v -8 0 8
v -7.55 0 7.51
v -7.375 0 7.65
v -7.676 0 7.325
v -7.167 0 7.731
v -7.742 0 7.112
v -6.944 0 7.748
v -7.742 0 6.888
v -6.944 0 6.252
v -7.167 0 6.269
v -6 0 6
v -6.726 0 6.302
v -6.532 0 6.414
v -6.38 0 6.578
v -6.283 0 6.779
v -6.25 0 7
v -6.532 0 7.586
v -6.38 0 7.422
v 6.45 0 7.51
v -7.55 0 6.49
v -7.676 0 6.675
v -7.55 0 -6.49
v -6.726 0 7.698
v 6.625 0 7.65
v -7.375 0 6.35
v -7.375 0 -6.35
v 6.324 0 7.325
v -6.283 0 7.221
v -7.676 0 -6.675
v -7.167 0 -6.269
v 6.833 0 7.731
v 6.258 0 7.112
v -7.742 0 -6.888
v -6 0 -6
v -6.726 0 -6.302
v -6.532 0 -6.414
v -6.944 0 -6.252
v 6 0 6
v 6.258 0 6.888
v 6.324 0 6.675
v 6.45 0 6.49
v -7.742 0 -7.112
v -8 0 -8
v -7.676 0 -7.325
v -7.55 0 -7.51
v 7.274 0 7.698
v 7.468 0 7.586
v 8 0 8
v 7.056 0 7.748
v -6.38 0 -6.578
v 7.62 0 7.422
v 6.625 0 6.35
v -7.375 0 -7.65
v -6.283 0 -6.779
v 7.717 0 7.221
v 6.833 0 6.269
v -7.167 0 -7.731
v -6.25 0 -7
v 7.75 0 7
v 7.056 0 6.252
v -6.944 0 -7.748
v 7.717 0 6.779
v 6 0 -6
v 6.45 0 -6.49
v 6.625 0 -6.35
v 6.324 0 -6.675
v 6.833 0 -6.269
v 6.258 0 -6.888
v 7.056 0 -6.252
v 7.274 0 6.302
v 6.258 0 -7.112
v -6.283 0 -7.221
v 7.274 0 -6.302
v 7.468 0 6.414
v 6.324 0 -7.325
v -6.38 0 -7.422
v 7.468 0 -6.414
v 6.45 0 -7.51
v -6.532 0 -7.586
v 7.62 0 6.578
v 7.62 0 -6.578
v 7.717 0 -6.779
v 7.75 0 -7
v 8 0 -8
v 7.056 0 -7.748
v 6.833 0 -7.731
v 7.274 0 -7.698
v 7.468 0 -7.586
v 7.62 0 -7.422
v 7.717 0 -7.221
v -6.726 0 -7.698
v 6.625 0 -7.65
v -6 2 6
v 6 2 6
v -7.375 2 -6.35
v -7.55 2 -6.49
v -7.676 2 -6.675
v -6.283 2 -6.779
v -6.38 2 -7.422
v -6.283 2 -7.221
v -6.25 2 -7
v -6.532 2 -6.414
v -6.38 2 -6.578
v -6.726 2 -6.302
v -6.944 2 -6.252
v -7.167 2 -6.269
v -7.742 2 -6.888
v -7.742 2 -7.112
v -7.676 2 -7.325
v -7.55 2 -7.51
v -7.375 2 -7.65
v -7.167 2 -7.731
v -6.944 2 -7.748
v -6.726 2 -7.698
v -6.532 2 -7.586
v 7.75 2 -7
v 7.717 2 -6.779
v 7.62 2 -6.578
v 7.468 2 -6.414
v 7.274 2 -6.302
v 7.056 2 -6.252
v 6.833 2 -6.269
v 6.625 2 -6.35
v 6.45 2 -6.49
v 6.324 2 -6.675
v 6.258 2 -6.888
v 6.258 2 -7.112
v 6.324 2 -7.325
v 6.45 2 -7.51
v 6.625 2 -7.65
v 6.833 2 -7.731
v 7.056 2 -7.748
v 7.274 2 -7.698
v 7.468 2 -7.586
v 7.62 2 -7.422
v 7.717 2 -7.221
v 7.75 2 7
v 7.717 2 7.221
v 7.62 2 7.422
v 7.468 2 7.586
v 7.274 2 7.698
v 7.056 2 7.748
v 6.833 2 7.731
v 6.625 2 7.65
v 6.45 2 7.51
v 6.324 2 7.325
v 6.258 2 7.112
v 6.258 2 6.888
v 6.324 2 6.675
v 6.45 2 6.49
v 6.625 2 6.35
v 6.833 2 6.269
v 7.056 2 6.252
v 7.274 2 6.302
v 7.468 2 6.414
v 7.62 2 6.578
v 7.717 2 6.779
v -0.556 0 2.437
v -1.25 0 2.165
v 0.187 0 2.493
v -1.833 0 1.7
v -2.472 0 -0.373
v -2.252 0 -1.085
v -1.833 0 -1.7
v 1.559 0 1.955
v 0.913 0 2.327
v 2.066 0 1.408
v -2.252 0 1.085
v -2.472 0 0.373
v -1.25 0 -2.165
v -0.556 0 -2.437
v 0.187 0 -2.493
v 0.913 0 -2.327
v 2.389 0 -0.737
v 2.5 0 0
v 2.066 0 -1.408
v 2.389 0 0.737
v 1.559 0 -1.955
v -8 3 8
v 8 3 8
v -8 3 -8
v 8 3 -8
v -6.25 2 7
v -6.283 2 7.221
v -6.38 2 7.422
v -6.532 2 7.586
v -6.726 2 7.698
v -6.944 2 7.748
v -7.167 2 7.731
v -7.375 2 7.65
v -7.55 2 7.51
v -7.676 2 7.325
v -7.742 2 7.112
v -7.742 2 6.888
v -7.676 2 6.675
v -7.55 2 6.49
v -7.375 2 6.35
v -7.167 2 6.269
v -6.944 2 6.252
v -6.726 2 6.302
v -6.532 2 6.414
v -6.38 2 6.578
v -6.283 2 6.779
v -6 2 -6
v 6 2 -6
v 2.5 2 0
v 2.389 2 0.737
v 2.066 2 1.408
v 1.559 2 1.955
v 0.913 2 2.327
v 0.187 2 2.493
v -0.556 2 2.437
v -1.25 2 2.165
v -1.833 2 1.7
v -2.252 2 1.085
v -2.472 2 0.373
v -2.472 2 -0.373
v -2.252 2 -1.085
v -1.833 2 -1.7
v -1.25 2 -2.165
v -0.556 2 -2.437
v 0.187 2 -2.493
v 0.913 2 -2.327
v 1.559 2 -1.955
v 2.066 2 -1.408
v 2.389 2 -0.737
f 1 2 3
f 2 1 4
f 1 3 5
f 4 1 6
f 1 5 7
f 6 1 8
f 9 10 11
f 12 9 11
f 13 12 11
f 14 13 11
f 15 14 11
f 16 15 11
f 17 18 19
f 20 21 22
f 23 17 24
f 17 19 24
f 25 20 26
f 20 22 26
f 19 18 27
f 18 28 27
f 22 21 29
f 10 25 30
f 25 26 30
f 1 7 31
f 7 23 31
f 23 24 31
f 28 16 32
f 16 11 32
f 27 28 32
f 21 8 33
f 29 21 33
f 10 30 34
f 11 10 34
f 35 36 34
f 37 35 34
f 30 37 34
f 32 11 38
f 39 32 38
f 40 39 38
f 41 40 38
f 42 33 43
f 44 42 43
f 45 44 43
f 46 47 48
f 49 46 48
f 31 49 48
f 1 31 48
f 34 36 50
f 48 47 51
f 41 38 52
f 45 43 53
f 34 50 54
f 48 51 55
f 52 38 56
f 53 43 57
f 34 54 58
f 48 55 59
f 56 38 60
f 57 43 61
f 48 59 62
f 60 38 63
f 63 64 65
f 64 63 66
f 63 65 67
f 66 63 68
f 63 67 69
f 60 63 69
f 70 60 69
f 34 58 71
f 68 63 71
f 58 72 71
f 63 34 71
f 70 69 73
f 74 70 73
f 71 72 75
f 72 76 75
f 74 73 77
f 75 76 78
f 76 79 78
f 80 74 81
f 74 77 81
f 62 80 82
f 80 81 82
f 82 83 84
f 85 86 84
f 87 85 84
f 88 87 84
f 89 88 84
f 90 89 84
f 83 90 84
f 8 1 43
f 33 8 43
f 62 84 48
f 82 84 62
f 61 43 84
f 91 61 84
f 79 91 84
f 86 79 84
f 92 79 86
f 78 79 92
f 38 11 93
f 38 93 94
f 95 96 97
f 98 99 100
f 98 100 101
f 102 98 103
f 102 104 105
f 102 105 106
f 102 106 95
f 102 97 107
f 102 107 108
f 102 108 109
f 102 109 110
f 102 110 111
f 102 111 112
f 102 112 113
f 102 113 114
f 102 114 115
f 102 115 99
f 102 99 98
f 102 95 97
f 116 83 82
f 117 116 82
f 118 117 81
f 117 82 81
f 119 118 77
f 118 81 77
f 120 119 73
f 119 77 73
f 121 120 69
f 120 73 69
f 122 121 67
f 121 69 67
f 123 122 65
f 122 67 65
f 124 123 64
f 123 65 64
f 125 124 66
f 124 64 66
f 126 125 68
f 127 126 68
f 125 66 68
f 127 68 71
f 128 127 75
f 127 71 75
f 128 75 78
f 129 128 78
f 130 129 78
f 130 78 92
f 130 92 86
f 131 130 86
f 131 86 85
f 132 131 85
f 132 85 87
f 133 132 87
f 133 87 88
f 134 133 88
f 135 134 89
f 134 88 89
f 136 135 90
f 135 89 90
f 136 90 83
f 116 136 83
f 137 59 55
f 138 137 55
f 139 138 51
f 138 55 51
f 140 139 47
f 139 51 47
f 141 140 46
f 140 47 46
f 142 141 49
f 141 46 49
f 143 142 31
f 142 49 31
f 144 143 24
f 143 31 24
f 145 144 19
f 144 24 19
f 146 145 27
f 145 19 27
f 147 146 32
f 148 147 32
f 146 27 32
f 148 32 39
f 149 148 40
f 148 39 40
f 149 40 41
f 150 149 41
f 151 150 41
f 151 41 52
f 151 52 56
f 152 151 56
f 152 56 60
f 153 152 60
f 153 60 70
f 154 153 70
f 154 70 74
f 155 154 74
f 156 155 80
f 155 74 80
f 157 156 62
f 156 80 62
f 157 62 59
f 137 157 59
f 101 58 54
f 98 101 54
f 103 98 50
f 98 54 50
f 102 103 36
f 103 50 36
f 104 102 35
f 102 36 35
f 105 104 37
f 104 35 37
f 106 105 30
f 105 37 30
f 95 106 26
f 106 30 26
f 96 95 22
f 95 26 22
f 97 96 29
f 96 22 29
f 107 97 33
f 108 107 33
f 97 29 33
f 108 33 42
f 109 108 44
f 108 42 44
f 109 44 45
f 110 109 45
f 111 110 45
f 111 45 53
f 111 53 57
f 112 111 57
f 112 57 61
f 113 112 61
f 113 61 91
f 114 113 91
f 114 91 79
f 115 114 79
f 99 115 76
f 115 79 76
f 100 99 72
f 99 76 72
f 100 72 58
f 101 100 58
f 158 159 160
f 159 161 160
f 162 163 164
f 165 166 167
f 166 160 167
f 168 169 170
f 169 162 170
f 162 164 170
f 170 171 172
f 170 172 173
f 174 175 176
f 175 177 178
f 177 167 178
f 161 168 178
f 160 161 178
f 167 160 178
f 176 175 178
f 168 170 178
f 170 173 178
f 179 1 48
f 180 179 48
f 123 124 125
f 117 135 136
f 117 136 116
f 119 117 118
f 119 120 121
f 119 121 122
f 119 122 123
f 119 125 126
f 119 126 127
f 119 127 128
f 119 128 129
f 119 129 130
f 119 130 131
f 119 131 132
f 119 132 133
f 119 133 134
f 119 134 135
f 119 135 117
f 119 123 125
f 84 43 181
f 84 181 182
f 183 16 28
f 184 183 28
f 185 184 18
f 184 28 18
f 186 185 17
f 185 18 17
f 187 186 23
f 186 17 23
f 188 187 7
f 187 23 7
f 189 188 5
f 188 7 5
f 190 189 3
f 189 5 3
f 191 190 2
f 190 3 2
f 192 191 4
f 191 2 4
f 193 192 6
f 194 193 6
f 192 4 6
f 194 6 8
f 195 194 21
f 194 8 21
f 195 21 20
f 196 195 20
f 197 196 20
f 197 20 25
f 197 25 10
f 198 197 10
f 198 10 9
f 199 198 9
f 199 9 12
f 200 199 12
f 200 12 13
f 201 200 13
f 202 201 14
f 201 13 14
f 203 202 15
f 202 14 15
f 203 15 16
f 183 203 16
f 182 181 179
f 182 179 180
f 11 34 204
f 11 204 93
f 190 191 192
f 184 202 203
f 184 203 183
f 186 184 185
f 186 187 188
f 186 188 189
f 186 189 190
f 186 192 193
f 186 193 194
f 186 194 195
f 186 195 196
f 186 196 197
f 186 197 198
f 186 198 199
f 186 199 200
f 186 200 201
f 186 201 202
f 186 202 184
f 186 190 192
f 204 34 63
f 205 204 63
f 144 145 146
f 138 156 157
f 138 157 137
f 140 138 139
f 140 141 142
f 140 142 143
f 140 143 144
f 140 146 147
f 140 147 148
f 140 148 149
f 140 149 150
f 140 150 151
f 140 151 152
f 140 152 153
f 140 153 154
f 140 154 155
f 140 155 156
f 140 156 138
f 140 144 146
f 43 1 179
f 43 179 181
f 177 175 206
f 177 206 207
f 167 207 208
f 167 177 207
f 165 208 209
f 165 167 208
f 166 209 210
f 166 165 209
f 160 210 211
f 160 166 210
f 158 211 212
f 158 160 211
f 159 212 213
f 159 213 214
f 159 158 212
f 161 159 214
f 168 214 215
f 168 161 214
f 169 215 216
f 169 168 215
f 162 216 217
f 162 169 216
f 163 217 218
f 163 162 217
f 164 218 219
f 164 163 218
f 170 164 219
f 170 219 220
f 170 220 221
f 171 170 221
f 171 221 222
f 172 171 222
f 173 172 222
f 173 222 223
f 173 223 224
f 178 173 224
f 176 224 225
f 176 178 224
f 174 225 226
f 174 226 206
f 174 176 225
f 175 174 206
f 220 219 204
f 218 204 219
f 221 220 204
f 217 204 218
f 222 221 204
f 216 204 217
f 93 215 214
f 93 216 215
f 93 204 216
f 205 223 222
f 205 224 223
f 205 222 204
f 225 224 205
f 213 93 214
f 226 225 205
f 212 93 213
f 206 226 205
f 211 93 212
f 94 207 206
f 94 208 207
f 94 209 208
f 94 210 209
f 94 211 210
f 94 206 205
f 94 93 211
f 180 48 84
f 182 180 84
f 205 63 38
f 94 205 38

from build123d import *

# Parameters (mm, degrees)
SKETCH1_W           = 16
SKETCH1_H           = 16
BOSS_EXTRUDE1_DEPTH = 3
SKETCH2_W           = 12
SKETCH2_H           = 12
SKETCH2_R           = 2.5
CUT_EXTRUDE1_DEPTH  = 2
SKETCH3_R           = 0.75
CUT_EXTRUDE2_DEPTH  = 2


with BuildPart() as part:
    # Sketch1 → Boss-Extrude1 (new body)
    with BuildSketch(Plane(origin=(0, 0, 0), x_dir=(1, 0, 0), z_dir=(0, 1, 0))):
        Rectangle(SKETCH1_W, SKETCH1_H)
    extrude(amount=BOSS_EXTRUDE1_DEPTH)

    # Sketch2 → Cut-Extrude1 (cut)
    with BuildSketch(Plane.XZ):
        Rectangle(SKETCH2_W, SKETCH2_H)
        Circle(SKETCH2_R, mode=Mode.SUBTRACT)
    extrude(amount=-CUT_EXTRUDE1_DEPTH, mode=Mode.SUBTRACT)

    # Sketch3 → Cut-Extrude2 (cut)
    with BuildSketch(Plane.XZ):
        with Locations((-7, 7)):
            Circle(SKETCH3_R)
        with Locations((7, 7)):
            Circle(SKETCH3_R)
        with Locations((7, -7)):
            Circle(SKETCH3_R)
        with Locations((-7, -7)):
            Circle(SKETCH3_R)
    extrude(amount=-CUT_EXTRUDE2_DEPTH, mode=Mode.SUBTRACT)


solid = part.part
